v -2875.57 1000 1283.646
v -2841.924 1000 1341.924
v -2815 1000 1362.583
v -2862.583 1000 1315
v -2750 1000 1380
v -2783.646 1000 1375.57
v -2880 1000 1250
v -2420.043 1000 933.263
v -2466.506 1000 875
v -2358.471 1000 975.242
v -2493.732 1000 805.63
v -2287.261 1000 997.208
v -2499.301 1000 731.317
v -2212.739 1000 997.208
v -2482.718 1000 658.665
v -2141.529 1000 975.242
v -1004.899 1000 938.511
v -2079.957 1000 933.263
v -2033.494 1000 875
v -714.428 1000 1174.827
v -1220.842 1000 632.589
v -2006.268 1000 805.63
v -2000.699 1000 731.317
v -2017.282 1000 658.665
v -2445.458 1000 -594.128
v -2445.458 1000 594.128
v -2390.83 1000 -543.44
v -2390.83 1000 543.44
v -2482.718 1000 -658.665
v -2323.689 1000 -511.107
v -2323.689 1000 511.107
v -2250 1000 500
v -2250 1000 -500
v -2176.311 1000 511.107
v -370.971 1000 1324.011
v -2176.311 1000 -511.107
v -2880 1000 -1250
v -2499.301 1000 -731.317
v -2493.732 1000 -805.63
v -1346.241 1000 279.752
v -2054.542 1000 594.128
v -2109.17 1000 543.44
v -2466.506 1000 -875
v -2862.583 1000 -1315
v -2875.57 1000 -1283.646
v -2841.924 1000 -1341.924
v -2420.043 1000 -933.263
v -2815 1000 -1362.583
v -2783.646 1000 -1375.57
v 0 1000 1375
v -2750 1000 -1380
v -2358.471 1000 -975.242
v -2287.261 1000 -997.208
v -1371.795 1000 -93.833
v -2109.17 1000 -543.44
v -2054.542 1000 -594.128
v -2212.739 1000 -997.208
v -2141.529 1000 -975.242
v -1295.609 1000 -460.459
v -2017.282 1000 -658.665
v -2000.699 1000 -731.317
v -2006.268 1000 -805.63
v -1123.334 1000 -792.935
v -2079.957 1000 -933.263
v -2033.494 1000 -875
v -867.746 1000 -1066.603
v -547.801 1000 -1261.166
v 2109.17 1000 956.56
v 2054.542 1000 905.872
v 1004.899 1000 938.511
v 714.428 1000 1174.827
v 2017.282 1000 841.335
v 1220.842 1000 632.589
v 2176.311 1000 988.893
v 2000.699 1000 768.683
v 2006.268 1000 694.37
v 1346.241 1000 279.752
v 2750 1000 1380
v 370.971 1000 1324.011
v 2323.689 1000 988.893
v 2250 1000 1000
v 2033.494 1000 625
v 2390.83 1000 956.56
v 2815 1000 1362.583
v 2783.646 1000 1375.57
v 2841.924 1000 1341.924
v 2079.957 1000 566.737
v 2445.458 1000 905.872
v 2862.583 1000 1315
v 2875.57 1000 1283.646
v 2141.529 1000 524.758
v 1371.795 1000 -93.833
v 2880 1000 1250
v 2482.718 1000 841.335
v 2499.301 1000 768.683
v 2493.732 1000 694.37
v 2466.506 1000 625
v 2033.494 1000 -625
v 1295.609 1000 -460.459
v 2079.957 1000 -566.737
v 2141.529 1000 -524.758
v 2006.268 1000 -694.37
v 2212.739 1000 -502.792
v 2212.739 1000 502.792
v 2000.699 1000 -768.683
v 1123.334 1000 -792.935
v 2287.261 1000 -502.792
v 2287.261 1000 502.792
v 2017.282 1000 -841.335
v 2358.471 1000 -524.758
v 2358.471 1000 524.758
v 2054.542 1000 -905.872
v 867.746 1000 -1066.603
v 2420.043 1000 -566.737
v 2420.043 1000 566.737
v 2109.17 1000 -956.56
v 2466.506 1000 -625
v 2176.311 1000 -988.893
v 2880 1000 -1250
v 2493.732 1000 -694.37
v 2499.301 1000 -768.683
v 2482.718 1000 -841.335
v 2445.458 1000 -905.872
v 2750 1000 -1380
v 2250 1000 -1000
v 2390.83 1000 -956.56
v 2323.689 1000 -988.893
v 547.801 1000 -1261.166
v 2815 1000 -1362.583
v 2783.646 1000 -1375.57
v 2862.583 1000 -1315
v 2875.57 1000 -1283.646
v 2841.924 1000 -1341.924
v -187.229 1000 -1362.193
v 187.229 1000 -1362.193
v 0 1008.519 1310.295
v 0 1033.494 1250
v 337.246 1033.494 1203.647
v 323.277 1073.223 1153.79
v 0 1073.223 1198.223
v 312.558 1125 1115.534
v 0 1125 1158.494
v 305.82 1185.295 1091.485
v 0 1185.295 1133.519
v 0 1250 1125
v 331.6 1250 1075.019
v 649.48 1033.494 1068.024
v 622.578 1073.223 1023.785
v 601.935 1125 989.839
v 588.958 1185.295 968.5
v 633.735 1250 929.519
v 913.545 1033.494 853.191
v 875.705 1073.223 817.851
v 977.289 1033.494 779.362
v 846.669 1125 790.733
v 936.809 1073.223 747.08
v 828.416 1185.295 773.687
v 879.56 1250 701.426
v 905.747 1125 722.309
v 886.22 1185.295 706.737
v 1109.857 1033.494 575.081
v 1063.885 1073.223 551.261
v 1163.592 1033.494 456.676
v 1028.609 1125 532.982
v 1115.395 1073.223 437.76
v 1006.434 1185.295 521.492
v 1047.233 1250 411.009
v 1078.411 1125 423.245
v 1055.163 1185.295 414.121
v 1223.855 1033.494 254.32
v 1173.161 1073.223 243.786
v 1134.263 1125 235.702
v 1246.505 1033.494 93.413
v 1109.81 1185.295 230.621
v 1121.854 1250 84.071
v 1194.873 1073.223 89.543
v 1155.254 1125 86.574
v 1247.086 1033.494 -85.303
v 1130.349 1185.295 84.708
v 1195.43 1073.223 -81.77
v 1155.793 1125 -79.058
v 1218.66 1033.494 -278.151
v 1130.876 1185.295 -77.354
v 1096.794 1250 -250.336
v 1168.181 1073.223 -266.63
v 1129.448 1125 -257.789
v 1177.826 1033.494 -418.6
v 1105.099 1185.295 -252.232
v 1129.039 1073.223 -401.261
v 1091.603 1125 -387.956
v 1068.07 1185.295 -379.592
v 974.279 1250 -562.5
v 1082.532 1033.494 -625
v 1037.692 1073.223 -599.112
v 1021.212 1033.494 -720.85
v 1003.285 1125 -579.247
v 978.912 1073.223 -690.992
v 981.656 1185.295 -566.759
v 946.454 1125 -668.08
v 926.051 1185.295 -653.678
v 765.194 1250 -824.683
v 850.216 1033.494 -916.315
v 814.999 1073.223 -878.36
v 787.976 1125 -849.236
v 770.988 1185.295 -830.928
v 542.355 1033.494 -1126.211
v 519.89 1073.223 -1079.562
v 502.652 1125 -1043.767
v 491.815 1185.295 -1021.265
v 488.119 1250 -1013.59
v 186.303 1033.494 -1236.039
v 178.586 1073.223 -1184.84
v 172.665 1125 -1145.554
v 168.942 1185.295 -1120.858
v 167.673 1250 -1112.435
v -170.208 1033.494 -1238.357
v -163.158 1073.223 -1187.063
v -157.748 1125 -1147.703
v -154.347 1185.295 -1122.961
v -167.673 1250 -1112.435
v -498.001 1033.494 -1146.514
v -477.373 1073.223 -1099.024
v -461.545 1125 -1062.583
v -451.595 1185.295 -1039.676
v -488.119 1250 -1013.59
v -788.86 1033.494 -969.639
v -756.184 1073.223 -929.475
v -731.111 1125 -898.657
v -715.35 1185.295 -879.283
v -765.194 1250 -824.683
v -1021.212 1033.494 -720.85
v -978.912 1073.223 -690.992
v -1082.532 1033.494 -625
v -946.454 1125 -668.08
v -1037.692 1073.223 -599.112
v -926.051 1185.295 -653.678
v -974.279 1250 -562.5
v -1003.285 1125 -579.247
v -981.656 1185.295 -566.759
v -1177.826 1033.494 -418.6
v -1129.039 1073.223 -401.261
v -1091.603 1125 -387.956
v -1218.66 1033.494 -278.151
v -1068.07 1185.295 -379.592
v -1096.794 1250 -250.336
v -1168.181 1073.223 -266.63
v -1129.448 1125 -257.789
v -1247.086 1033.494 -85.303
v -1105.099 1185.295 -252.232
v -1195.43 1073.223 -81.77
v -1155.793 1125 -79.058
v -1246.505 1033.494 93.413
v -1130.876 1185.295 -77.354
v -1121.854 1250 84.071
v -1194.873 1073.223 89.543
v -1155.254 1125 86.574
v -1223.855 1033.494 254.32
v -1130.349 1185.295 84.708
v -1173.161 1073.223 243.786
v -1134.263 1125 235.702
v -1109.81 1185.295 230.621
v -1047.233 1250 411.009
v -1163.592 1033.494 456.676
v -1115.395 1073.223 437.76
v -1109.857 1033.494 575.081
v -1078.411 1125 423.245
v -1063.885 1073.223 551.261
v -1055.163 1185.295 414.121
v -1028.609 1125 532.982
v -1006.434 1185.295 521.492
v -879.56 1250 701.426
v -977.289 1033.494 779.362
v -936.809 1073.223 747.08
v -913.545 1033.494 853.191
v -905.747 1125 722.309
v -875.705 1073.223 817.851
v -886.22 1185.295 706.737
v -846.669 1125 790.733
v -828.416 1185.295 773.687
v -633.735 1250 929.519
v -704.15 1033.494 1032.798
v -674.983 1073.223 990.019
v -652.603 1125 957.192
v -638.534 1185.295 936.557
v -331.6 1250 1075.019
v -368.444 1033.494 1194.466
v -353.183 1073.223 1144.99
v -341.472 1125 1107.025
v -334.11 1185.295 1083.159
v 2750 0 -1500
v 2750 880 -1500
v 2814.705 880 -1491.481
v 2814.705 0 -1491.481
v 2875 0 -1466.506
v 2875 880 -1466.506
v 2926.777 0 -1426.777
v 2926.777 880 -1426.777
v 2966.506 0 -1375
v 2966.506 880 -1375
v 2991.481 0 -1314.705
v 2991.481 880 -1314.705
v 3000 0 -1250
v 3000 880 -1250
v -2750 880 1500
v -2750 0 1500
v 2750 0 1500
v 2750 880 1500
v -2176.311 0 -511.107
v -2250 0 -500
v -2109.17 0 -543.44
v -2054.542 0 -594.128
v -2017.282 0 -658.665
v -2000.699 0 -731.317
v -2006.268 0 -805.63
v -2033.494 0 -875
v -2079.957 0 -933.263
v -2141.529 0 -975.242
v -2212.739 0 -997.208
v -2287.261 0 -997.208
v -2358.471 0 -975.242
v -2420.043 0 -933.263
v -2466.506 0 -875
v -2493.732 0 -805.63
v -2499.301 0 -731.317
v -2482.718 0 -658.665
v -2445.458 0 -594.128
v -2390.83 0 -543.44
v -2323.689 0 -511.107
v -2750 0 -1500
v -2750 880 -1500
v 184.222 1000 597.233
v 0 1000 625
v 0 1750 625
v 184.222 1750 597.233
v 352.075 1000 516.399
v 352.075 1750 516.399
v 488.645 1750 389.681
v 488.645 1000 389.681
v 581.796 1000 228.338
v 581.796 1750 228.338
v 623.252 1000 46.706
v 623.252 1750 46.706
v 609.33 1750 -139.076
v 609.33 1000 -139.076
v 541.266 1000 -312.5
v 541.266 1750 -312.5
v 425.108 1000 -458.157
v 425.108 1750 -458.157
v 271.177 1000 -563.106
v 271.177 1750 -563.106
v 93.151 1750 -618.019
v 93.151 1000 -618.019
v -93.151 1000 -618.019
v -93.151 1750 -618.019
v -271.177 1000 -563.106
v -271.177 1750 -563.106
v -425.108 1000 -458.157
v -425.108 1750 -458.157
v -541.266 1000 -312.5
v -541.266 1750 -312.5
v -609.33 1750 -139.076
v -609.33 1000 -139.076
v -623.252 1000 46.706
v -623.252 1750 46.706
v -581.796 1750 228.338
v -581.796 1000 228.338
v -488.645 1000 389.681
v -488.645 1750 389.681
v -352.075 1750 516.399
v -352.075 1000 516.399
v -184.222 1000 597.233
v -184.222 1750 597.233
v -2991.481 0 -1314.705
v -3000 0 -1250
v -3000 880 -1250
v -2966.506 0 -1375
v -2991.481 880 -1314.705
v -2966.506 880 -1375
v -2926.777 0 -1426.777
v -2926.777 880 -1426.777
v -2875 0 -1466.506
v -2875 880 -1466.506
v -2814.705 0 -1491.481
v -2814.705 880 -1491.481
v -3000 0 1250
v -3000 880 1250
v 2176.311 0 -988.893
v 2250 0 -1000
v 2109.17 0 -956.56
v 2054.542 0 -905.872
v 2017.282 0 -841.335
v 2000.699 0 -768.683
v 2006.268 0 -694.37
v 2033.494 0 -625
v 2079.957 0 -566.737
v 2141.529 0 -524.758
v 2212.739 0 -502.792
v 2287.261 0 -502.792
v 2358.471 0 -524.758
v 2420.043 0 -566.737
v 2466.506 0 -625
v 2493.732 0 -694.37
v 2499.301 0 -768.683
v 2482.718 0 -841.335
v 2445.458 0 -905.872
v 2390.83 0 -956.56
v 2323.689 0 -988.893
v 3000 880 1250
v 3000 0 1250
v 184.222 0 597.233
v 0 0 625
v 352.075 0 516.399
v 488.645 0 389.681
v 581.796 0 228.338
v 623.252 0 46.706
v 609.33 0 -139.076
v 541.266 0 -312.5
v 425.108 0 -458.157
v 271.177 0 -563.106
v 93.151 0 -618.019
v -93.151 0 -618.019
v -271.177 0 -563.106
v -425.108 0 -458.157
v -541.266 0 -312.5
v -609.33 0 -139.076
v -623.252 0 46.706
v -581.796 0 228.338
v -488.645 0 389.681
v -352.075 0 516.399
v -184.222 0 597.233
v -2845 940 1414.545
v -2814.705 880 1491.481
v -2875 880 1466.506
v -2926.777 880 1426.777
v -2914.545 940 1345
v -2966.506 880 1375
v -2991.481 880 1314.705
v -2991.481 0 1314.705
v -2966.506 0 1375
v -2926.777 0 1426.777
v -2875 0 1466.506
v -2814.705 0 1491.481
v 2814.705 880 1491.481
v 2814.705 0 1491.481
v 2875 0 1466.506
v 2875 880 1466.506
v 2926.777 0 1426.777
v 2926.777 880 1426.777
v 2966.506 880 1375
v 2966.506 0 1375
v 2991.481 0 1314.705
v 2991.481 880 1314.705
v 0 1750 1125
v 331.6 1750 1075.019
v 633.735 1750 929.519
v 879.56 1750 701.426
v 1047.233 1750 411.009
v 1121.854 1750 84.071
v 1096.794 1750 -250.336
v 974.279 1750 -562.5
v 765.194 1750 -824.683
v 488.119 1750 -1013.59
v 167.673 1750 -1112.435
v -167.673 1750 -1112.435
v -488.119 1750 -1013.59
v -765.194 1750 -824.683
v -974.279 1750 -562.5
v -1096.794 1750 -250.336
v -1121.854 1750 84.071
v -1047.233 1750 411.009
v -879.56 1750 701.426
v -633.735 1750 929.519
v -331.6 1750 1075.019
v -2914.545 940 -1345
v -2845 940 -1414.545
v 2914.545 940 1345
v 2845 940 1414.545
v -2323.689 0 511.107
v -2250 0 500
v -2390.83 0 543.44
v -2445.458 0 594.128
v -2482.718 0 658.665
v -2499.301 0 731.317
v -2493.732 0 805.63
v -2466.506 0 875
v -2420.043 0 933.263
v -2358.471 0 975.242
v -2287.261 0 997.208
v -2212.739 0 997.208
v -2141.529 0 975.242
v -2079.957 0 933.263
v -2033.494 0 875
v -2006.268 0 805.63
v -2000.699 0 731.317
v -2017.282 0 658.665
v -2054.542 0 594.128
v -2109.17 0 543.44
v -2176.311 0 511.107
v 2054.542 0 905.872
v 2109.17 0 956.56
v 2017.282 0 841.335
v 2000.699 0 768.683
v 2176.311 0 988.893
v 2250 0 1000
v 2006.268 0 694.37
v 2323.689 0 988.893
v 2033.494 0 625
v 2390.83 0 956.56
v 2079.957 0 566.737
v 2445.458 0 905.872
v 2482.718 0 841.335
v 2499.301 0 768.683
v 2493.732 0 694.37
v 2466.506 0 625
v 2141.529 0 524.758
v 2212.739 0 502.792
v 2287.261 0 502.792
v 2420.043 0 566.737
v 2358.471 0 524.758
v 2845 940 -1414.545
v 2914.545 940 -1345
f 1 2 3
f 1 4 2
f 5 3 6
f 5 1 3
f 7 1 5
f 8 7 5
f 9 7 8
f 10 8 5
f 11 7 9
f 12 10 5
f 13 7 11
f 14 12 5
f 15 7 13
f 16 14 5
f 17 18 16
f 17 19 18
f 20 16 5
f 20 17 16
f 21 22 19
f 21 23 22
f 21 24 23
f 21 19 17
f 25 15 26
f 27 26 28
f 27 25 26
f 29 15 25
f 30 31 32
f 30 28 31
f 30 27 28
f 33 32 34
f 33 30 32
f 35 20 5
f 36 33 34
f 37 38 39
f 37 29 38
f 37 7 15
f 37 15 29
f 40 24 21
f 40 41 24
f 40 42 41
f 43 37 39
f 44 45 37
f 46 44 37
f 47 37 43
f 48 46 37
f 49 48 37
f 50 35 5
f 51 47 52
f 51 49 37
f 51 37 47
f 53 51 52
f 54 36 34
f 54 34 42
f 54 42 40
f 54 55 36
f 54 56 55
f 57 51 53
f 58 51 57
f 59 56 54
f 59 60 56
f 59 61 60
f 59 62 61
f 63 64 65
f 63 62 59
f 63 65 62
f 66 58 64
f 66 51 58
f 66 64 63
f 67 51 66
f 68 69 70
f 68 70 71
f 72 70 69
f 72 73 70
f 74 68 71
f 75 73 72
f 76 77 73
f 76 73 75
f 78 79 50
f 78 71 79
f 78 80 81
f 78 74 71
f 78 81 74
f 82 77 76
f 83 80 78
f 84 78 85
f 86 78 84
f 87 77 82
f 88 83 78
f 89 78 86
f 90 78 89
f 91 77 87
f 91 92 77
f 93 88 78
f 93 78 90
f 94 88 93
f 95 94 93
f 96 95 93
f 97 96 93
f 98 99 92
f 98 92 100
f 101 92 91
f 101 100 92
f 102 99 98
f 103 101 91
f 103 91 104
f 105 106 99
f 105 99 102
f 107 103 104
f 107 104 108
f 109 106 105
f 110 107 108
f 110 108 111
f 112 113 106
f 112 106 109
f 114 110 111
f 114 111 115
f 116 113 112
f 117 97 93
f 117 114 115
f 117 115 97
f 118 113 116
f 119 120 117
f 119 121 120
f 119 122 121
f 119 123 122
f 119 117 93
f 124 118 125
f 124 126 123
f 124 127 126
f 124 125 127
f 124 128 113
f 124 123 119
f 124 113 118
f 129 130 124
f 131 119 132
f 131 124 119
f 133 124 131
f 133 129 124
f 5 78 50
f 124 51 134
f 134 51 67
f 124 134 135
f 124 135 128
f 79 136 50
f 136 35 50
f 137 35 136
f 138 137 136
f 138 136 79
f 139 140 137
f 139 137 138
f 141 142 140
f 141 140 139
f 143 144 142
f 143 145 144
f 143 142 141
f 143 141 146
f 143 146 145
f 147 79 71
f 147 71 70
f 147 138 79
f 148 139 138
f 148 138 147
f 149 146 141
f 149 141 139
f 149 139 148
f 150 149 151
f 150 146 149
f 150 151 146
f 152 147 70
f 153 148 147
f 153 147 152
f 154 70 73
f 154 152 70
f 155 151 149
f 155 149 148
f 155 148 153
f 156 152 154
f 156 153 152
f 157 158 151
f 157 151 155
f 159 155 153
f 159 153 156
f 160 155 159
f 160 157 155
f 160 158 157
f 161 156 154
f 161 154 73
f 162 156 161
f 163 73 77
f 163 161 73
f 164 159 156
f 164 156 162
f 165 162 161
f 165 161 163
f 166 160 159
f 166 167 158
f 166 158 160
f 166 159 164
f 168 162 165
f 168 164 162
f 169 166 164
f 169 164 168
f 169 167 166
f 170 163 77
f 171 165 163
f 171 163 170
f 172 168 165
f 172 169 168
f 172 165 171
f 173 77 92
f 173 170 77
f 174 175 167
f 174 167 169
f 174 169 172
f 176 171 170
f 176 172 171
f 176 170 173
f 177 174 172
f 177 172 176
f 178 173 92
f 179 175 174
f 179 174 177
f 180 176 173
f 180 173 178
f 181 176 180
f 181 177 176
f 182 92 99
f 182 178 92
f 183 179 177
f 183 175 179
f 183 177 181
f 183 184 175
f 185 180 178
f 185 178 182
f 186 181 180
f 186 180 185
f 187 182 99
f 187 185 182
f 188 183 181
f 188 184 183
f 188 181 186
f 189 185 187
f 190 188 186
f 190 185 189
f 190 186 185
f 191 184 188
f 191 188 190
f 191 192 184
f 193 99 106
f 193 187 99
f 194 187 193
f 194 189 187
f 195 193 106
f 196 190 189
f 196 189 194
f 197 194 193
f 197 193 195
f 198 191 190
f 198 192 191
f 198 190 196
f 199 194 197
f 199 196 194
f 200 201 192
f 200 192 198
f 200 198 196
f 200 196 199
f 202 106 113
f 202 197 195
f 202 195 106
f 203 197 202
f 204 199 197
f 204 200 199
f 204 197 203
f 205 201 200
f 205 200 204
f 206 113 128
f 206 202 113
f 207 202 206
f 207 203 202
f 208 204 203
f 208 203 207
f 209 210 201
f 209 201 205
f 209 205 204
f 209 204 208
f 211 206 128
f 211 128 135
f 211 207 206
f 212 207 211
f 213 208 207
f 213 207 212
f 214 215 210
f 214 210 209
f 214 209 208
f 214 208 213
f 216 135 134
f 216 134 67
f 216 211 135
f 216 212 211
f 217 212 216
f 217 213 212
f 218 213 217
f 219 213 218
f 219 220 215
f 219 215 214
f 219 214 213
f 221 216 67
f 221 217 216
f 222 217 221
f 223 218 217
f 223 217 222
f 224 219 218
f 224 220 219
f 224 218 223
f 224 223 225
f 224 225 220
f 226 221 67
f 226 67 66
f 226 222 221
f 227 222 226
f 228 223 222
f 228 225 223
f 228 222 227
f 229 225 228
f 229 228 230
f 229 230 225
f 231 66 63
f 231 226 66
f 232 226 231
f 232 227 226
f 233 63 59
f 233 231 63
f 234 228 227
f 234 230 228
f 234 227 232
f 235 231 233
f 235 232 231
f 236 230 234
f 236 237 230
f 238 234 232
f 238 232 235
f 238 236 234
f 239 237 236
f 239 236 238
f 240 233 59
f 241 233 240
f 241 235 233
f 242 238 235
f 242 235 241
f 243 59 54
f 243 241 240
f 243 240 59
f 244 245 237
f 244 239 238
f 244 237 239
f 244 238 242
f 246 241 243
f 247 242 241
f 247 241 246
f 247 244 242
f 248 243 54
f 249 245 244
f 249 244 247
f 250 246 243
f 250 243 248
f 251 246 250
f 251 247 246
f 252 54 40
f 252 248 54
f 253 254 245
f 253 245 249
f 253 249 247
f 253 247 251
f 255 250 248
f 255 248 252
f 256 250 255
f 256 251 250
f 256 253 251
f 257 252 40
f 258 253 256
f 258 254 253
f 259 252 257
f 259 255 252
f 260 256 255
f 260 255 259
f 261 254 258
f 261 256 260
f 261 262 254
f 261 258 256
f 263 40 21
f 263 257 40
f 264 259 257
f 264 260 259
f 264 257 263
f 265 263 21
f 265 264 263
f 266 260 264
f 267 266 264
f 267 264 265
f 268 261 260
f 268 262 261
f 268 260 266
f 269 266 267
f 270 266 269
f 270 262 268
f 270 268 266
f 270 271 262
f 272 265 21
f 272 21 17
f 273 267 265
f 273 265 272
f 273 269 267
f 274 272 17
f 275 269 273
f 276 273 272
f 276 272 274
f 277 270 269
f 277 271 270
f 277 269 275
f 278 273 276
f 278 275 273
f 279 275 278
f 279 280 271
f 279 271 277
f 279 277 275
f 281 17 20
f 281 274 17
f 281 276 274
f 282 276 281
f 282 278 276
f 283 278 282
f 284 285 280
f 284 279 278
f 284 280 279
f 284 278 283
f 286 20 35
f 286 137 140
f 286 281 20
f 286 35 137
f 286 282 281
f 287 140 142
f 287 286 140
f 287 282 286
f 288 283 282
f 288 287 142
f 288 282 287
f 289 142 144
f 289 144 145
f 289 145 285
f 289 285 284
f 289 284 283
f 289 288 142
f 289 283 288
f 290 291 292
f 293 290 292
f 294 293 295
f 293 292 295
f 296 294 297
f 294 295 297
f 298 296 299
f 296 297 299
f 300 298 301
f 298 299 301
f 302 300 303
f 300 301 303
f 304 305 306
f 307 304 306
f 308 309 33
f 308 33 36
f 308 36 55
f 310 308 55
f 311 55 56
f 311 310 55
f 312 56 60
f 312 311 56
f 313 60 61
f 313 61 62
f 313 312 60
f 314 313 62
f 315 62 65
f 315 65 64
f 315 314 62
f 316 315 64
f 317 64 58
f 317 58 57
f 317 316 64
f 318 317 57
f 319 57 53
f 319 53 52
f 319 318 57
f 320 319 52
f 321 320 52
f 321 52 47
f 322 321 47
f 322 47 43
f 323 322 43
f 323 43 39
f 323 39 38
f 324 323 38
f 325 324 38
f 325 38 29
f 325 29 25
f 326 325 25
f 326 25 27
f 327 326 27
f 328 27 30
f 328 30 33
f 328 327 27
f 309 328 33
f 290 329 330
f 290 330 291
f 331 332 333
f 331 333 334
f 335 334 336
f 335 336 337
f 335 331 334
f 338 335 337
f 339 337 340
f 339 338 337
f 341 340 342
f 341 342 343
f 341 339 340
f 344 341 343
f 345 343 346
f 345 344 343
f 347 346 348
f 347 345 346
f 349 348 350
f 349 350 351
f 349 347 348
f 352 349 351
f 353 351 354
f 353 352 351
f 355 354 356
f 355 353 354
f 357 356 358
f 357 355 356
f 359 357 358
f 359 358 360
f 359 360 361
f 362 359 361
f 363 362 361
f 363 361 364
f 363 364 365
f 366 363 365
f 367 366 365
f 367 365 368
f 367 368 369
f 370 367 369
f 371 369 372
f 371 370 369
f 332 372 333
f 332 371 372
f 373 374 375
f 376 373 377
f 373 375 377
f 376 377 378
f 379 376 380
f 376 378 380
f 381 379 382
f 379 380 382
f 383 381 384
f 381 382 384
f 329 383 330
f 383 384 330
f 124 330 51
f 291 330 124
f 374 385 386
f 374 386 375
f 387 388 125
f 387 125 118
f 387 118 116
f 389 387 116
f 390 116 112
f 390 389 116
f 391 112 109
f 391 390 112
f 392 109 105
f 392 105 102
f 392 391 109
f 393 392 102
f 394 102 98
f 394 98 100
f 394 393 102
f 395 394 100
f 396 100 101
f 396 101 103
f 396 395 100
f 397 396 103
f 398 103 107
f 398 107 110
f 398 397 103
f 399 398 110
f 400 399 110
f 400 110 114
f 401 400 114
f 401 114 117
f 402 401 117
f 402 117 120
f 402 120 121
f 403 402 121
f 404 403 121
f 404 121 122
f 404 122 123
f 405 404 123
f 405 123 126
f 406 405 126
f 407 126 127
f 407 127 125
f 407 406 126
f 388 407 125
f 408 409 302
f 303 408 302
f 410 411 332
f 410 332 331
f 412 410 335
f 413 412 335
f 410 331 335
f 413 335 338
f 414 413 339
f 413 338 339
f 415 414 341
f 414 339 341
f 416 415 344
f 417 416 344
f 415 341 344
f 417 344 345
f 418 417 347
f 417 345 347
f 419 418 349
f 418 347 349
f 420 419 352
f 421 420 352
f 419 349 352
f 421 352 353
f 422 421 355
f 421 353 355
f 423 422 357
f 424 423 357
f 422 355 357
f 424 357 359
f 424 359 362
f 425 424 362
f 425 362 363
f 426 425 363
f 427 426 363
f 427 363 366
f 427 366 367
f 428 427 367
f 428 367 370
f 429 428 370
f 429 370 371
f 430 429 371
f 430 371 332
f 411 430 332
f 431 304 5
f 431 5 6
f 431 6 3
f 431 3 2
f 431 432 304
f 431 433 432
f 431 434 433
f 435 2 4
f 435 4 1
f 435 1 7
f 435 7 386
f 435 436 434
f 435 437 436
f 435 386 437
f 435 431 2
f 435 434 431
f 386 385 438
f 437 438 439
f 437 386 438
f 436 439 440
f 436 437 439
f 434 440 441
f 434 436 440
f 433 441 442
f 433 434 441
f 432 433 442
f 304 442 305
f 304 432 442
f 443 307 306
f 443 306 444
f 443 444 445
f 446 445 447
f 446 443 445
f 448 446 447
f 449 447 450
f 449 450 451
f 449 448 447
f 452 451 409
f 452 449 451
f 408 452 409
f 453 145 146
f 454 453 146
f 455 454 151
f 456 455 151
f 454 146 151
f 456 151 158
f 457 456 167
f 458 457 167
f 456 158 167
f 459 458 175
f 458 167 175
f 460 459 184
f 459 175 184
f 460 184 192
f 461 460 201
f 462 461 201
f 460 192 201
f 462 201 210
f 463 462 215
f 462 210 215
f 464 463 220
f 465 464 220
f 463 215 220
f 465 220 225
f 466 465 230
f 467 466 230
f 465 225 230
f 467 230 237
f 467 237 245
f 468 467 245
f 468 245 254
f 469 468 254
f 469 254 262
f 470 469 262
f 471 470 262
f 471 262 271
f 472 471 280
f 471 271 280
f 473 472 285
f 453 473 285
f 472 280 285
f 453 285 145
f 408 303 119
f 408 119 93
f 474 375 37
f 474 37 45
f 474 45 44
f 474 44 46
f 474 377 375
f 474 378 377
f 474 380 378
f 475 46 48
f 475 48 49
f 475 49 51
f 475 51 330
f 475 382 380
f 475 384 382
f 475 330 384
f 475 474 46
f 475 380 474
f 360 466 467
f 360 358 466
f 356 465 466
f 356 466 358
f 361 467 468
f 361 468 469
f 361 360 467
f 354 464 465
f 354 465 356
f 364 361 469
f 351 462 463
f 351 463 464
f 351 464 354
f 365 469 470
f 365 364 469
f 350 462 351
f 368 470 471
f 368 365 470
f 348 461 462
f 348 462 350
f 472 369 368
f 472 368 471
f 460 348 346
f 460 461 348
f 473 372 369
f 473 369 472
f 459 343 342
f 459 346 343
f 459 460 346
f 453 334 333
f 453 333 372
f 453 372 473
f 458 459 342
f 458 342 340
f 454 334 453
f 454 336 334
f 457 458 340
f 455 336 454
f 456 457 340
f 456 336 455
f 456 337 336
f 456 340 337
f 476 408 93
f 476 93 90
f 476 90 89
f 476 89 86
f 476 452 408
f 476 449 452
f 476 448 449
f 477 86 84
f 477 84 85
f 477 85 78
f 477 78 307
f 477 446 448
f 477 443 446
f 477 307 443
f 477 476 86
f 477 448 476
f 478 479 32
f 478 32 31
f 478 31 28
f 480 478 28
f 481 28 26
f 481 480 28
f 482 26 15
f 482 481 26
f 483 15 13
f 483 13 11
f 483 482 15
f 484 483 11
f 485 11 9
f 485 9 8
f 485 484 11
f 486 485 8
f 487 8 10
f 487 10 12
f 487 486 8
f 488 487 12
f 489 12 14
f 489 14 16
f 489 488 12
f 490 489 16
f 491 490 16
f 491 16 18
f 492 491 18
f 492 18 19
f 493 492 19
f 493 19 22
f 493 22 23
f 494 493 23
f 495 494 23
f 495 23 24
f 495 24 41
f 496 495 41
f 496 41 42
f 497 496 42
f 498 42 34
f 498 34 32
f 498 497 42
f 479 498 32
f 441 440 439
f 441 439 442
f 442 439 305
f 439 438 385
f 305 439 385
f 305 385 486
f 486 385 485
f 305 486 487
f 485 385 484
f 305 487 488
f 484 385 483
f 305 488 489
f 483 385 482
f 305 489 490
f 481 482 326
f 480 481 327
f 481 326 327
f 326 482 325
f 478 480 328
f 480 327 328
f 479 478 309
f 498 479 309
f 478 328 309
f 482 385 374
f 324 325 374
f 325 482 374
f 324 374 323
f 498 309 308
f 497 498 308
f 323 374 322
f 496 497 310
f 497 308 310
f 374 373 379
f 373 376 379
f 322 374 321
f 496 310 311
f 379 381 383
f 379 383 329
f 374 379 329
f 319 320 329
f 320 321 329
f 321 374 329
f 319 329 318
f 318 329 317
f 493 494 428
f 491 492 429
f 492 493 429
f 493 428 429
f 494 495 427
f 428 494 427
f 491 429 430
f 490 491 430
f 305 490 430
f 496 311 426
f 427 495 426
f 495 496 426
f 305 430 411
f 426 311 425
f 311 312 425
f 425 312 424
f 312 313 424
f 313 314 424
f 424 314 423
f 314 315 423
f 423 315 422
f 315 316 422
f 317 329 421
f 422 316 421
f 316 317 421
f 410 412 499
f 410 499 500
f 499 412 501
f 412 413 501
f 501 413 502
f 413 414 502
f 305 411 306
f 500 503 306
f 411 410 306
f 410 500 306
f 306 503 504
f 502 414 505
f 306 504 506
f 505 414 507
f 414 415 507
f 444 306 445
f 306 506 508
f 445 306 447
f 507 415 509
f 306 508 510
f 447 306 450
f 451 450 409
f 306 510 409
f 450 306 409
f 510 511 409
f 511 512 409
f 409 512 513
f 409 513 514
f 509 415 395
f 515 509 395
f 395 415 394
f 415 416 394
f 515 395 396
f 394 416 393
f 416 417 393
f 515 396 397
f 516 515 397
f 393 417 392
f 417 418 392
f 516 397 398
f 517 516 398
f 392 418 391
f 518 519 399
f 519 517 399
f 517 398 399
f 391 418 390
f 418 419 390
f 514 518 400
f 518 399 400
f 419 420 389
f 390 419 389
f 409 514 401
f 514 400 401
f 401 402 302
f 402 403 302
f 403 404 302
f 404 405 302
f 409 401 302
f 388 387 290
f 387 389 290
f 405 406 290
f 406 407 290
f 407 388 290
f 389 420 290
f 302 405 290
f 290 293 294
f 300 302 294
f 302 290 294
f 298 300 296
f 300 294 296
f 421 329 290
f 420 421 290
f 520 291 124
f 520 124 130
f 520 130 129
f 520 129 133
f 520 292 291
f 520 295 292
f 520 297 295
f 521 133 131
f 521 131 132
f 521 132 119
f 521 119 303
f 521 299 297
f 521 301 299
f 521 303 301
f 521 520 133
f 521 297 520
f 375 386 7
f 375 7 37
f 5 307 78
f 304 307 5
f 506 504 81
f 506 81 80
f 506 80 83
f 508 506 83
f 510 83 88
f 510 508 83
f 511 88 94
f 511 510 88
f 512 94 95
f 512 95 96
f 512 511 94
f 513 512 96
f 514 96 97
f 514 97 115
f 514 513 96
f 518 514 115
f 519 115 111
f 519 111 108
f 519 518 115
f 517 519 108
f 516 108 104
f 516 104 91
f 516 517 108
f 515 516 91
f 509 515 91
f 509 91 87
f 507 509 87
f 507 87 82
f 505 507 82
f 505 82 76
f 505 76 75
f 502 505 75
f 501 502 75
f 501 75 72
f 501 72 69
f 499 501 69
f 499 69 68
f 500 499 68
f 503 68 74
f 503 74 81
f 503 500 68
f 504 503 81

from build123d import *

# Parameters (mm, degrees)
SKETCH1_W           = 6000
SKETCH1_H           = 3000
SKETCH1_R           = 250
BOSS_EXTRUDE1_DEPTH = 1000
SKETCH2_R           = 1125
SKETCH2_R_2         = 625
BOSS_EXTRUDE2_DEPTH = 750
SKETCH4_R           = 625
CUT_EXTRUDE1_DEPTH  = 3501
FILLET1_R           = 250
FILLET2_R           = 250
CHAMFER1_SIZE       = 120


with BuildPart() as part:
    # Sketch1 → Boss-Extrude1 (new body)
    with BuildSketch(Plane(origin=(0, 0, 0), x_dir=(1, 0, 0), z_dir=(0, 1, 0))):
        Rectangle(SKETCH1_W, SKETCH1_H)
        with Locations(Location((-2250, 750, 0), (0, 0, 270))):
            Circle(SKETCH1_R, mode=Mode.SUBTRACT)
        with Locations(Location((2250, 750, 0), (0, 0, 90))):
            Circle(SKETCH1_R, mode=Mode.SUBTRACT)
        with Locations(Location((-2250, -750, 0), (0, 0, 90))):
            Circle(SKETCH1_R, mode=Mode.SUBTRACT)
        with Locations(Location((2250, -750, 0), (0, 0, 270))):
            Circle(SKETCH1_R, mode=Mode.SUBTRACT)
    extrude(amount=BOSS_EXTRUDE1_DEPTH)

    # Sketch2 → Boss-Extrude2 (add)
    with BuildSketch(Plane(origin=(0, 1000, 0), x_dir=(1, 0, 0), z_dir=(0, 1, 0))):
        with Locations(Location((0, 0, 0), (0, 0, 270))):
            Circle(SKETCH2_R)
        with Locations(Location((0, 0, 0), (0, 0, 270))):
            Circle(SKETCH2_R_2, mode=Mode.SUBTRACT)
    extrude(amount=BOSS_EXTRUDE2_DEPTH)

    # Sketch4 → Cut-Extrude1 (cut, through all)
    with BuildSketch(Plane(origin=(0, 1000, 0), x_dir=(1, 0, 0), z_dir=(0, 1, 0))):
        with Locations(Location((0, 0, 0), (0, 0, 270))):
            Circle(SKETCH4_R)
    extrude(amount=-CUT_EXTRUDE1_DEPTH, mode=Mode.SUBTRACT)

    # Fillet1
    fillet1_edges = [part.edges().sort_by_distance(p)[0] for p in [
        (0, 1000, -1125),
    ]]
    fillet(fillet1_edges, radius=FILLET1_R)

    # Fillet2
    fillet2_edges = [part.edges().sort_by_distance(p)[0] for p in [
        (-3000, 500, -1500),
        (3000, 500, -1500),
        (3000, 500, 1500),
        (-3000, 500, 1500),
    ]]
    fillet(fillet2_edges, radius=FILLET2_R)

    # Chamfer1
    chamfer1_edges = [part.edges().sort_by_distance(p)[0] for p in [
        (-3000, 1000, 0),
        (0, 1000, -1500),
        (0, 1000, 1500),
        (3000, 1000, 0),
        (-2926.776695297, 1000, 1426.776695297),
        (2926.776695297, 1000, 1426.776695297),
        (2926.776695297, 1000, -1426.776695297),
        (-2926.776695297, 1000, -1426.776695297),
    ]]
    chamfer(chamfer1_edges, length=CHAMFER1_SIZE)


solid = part.part
